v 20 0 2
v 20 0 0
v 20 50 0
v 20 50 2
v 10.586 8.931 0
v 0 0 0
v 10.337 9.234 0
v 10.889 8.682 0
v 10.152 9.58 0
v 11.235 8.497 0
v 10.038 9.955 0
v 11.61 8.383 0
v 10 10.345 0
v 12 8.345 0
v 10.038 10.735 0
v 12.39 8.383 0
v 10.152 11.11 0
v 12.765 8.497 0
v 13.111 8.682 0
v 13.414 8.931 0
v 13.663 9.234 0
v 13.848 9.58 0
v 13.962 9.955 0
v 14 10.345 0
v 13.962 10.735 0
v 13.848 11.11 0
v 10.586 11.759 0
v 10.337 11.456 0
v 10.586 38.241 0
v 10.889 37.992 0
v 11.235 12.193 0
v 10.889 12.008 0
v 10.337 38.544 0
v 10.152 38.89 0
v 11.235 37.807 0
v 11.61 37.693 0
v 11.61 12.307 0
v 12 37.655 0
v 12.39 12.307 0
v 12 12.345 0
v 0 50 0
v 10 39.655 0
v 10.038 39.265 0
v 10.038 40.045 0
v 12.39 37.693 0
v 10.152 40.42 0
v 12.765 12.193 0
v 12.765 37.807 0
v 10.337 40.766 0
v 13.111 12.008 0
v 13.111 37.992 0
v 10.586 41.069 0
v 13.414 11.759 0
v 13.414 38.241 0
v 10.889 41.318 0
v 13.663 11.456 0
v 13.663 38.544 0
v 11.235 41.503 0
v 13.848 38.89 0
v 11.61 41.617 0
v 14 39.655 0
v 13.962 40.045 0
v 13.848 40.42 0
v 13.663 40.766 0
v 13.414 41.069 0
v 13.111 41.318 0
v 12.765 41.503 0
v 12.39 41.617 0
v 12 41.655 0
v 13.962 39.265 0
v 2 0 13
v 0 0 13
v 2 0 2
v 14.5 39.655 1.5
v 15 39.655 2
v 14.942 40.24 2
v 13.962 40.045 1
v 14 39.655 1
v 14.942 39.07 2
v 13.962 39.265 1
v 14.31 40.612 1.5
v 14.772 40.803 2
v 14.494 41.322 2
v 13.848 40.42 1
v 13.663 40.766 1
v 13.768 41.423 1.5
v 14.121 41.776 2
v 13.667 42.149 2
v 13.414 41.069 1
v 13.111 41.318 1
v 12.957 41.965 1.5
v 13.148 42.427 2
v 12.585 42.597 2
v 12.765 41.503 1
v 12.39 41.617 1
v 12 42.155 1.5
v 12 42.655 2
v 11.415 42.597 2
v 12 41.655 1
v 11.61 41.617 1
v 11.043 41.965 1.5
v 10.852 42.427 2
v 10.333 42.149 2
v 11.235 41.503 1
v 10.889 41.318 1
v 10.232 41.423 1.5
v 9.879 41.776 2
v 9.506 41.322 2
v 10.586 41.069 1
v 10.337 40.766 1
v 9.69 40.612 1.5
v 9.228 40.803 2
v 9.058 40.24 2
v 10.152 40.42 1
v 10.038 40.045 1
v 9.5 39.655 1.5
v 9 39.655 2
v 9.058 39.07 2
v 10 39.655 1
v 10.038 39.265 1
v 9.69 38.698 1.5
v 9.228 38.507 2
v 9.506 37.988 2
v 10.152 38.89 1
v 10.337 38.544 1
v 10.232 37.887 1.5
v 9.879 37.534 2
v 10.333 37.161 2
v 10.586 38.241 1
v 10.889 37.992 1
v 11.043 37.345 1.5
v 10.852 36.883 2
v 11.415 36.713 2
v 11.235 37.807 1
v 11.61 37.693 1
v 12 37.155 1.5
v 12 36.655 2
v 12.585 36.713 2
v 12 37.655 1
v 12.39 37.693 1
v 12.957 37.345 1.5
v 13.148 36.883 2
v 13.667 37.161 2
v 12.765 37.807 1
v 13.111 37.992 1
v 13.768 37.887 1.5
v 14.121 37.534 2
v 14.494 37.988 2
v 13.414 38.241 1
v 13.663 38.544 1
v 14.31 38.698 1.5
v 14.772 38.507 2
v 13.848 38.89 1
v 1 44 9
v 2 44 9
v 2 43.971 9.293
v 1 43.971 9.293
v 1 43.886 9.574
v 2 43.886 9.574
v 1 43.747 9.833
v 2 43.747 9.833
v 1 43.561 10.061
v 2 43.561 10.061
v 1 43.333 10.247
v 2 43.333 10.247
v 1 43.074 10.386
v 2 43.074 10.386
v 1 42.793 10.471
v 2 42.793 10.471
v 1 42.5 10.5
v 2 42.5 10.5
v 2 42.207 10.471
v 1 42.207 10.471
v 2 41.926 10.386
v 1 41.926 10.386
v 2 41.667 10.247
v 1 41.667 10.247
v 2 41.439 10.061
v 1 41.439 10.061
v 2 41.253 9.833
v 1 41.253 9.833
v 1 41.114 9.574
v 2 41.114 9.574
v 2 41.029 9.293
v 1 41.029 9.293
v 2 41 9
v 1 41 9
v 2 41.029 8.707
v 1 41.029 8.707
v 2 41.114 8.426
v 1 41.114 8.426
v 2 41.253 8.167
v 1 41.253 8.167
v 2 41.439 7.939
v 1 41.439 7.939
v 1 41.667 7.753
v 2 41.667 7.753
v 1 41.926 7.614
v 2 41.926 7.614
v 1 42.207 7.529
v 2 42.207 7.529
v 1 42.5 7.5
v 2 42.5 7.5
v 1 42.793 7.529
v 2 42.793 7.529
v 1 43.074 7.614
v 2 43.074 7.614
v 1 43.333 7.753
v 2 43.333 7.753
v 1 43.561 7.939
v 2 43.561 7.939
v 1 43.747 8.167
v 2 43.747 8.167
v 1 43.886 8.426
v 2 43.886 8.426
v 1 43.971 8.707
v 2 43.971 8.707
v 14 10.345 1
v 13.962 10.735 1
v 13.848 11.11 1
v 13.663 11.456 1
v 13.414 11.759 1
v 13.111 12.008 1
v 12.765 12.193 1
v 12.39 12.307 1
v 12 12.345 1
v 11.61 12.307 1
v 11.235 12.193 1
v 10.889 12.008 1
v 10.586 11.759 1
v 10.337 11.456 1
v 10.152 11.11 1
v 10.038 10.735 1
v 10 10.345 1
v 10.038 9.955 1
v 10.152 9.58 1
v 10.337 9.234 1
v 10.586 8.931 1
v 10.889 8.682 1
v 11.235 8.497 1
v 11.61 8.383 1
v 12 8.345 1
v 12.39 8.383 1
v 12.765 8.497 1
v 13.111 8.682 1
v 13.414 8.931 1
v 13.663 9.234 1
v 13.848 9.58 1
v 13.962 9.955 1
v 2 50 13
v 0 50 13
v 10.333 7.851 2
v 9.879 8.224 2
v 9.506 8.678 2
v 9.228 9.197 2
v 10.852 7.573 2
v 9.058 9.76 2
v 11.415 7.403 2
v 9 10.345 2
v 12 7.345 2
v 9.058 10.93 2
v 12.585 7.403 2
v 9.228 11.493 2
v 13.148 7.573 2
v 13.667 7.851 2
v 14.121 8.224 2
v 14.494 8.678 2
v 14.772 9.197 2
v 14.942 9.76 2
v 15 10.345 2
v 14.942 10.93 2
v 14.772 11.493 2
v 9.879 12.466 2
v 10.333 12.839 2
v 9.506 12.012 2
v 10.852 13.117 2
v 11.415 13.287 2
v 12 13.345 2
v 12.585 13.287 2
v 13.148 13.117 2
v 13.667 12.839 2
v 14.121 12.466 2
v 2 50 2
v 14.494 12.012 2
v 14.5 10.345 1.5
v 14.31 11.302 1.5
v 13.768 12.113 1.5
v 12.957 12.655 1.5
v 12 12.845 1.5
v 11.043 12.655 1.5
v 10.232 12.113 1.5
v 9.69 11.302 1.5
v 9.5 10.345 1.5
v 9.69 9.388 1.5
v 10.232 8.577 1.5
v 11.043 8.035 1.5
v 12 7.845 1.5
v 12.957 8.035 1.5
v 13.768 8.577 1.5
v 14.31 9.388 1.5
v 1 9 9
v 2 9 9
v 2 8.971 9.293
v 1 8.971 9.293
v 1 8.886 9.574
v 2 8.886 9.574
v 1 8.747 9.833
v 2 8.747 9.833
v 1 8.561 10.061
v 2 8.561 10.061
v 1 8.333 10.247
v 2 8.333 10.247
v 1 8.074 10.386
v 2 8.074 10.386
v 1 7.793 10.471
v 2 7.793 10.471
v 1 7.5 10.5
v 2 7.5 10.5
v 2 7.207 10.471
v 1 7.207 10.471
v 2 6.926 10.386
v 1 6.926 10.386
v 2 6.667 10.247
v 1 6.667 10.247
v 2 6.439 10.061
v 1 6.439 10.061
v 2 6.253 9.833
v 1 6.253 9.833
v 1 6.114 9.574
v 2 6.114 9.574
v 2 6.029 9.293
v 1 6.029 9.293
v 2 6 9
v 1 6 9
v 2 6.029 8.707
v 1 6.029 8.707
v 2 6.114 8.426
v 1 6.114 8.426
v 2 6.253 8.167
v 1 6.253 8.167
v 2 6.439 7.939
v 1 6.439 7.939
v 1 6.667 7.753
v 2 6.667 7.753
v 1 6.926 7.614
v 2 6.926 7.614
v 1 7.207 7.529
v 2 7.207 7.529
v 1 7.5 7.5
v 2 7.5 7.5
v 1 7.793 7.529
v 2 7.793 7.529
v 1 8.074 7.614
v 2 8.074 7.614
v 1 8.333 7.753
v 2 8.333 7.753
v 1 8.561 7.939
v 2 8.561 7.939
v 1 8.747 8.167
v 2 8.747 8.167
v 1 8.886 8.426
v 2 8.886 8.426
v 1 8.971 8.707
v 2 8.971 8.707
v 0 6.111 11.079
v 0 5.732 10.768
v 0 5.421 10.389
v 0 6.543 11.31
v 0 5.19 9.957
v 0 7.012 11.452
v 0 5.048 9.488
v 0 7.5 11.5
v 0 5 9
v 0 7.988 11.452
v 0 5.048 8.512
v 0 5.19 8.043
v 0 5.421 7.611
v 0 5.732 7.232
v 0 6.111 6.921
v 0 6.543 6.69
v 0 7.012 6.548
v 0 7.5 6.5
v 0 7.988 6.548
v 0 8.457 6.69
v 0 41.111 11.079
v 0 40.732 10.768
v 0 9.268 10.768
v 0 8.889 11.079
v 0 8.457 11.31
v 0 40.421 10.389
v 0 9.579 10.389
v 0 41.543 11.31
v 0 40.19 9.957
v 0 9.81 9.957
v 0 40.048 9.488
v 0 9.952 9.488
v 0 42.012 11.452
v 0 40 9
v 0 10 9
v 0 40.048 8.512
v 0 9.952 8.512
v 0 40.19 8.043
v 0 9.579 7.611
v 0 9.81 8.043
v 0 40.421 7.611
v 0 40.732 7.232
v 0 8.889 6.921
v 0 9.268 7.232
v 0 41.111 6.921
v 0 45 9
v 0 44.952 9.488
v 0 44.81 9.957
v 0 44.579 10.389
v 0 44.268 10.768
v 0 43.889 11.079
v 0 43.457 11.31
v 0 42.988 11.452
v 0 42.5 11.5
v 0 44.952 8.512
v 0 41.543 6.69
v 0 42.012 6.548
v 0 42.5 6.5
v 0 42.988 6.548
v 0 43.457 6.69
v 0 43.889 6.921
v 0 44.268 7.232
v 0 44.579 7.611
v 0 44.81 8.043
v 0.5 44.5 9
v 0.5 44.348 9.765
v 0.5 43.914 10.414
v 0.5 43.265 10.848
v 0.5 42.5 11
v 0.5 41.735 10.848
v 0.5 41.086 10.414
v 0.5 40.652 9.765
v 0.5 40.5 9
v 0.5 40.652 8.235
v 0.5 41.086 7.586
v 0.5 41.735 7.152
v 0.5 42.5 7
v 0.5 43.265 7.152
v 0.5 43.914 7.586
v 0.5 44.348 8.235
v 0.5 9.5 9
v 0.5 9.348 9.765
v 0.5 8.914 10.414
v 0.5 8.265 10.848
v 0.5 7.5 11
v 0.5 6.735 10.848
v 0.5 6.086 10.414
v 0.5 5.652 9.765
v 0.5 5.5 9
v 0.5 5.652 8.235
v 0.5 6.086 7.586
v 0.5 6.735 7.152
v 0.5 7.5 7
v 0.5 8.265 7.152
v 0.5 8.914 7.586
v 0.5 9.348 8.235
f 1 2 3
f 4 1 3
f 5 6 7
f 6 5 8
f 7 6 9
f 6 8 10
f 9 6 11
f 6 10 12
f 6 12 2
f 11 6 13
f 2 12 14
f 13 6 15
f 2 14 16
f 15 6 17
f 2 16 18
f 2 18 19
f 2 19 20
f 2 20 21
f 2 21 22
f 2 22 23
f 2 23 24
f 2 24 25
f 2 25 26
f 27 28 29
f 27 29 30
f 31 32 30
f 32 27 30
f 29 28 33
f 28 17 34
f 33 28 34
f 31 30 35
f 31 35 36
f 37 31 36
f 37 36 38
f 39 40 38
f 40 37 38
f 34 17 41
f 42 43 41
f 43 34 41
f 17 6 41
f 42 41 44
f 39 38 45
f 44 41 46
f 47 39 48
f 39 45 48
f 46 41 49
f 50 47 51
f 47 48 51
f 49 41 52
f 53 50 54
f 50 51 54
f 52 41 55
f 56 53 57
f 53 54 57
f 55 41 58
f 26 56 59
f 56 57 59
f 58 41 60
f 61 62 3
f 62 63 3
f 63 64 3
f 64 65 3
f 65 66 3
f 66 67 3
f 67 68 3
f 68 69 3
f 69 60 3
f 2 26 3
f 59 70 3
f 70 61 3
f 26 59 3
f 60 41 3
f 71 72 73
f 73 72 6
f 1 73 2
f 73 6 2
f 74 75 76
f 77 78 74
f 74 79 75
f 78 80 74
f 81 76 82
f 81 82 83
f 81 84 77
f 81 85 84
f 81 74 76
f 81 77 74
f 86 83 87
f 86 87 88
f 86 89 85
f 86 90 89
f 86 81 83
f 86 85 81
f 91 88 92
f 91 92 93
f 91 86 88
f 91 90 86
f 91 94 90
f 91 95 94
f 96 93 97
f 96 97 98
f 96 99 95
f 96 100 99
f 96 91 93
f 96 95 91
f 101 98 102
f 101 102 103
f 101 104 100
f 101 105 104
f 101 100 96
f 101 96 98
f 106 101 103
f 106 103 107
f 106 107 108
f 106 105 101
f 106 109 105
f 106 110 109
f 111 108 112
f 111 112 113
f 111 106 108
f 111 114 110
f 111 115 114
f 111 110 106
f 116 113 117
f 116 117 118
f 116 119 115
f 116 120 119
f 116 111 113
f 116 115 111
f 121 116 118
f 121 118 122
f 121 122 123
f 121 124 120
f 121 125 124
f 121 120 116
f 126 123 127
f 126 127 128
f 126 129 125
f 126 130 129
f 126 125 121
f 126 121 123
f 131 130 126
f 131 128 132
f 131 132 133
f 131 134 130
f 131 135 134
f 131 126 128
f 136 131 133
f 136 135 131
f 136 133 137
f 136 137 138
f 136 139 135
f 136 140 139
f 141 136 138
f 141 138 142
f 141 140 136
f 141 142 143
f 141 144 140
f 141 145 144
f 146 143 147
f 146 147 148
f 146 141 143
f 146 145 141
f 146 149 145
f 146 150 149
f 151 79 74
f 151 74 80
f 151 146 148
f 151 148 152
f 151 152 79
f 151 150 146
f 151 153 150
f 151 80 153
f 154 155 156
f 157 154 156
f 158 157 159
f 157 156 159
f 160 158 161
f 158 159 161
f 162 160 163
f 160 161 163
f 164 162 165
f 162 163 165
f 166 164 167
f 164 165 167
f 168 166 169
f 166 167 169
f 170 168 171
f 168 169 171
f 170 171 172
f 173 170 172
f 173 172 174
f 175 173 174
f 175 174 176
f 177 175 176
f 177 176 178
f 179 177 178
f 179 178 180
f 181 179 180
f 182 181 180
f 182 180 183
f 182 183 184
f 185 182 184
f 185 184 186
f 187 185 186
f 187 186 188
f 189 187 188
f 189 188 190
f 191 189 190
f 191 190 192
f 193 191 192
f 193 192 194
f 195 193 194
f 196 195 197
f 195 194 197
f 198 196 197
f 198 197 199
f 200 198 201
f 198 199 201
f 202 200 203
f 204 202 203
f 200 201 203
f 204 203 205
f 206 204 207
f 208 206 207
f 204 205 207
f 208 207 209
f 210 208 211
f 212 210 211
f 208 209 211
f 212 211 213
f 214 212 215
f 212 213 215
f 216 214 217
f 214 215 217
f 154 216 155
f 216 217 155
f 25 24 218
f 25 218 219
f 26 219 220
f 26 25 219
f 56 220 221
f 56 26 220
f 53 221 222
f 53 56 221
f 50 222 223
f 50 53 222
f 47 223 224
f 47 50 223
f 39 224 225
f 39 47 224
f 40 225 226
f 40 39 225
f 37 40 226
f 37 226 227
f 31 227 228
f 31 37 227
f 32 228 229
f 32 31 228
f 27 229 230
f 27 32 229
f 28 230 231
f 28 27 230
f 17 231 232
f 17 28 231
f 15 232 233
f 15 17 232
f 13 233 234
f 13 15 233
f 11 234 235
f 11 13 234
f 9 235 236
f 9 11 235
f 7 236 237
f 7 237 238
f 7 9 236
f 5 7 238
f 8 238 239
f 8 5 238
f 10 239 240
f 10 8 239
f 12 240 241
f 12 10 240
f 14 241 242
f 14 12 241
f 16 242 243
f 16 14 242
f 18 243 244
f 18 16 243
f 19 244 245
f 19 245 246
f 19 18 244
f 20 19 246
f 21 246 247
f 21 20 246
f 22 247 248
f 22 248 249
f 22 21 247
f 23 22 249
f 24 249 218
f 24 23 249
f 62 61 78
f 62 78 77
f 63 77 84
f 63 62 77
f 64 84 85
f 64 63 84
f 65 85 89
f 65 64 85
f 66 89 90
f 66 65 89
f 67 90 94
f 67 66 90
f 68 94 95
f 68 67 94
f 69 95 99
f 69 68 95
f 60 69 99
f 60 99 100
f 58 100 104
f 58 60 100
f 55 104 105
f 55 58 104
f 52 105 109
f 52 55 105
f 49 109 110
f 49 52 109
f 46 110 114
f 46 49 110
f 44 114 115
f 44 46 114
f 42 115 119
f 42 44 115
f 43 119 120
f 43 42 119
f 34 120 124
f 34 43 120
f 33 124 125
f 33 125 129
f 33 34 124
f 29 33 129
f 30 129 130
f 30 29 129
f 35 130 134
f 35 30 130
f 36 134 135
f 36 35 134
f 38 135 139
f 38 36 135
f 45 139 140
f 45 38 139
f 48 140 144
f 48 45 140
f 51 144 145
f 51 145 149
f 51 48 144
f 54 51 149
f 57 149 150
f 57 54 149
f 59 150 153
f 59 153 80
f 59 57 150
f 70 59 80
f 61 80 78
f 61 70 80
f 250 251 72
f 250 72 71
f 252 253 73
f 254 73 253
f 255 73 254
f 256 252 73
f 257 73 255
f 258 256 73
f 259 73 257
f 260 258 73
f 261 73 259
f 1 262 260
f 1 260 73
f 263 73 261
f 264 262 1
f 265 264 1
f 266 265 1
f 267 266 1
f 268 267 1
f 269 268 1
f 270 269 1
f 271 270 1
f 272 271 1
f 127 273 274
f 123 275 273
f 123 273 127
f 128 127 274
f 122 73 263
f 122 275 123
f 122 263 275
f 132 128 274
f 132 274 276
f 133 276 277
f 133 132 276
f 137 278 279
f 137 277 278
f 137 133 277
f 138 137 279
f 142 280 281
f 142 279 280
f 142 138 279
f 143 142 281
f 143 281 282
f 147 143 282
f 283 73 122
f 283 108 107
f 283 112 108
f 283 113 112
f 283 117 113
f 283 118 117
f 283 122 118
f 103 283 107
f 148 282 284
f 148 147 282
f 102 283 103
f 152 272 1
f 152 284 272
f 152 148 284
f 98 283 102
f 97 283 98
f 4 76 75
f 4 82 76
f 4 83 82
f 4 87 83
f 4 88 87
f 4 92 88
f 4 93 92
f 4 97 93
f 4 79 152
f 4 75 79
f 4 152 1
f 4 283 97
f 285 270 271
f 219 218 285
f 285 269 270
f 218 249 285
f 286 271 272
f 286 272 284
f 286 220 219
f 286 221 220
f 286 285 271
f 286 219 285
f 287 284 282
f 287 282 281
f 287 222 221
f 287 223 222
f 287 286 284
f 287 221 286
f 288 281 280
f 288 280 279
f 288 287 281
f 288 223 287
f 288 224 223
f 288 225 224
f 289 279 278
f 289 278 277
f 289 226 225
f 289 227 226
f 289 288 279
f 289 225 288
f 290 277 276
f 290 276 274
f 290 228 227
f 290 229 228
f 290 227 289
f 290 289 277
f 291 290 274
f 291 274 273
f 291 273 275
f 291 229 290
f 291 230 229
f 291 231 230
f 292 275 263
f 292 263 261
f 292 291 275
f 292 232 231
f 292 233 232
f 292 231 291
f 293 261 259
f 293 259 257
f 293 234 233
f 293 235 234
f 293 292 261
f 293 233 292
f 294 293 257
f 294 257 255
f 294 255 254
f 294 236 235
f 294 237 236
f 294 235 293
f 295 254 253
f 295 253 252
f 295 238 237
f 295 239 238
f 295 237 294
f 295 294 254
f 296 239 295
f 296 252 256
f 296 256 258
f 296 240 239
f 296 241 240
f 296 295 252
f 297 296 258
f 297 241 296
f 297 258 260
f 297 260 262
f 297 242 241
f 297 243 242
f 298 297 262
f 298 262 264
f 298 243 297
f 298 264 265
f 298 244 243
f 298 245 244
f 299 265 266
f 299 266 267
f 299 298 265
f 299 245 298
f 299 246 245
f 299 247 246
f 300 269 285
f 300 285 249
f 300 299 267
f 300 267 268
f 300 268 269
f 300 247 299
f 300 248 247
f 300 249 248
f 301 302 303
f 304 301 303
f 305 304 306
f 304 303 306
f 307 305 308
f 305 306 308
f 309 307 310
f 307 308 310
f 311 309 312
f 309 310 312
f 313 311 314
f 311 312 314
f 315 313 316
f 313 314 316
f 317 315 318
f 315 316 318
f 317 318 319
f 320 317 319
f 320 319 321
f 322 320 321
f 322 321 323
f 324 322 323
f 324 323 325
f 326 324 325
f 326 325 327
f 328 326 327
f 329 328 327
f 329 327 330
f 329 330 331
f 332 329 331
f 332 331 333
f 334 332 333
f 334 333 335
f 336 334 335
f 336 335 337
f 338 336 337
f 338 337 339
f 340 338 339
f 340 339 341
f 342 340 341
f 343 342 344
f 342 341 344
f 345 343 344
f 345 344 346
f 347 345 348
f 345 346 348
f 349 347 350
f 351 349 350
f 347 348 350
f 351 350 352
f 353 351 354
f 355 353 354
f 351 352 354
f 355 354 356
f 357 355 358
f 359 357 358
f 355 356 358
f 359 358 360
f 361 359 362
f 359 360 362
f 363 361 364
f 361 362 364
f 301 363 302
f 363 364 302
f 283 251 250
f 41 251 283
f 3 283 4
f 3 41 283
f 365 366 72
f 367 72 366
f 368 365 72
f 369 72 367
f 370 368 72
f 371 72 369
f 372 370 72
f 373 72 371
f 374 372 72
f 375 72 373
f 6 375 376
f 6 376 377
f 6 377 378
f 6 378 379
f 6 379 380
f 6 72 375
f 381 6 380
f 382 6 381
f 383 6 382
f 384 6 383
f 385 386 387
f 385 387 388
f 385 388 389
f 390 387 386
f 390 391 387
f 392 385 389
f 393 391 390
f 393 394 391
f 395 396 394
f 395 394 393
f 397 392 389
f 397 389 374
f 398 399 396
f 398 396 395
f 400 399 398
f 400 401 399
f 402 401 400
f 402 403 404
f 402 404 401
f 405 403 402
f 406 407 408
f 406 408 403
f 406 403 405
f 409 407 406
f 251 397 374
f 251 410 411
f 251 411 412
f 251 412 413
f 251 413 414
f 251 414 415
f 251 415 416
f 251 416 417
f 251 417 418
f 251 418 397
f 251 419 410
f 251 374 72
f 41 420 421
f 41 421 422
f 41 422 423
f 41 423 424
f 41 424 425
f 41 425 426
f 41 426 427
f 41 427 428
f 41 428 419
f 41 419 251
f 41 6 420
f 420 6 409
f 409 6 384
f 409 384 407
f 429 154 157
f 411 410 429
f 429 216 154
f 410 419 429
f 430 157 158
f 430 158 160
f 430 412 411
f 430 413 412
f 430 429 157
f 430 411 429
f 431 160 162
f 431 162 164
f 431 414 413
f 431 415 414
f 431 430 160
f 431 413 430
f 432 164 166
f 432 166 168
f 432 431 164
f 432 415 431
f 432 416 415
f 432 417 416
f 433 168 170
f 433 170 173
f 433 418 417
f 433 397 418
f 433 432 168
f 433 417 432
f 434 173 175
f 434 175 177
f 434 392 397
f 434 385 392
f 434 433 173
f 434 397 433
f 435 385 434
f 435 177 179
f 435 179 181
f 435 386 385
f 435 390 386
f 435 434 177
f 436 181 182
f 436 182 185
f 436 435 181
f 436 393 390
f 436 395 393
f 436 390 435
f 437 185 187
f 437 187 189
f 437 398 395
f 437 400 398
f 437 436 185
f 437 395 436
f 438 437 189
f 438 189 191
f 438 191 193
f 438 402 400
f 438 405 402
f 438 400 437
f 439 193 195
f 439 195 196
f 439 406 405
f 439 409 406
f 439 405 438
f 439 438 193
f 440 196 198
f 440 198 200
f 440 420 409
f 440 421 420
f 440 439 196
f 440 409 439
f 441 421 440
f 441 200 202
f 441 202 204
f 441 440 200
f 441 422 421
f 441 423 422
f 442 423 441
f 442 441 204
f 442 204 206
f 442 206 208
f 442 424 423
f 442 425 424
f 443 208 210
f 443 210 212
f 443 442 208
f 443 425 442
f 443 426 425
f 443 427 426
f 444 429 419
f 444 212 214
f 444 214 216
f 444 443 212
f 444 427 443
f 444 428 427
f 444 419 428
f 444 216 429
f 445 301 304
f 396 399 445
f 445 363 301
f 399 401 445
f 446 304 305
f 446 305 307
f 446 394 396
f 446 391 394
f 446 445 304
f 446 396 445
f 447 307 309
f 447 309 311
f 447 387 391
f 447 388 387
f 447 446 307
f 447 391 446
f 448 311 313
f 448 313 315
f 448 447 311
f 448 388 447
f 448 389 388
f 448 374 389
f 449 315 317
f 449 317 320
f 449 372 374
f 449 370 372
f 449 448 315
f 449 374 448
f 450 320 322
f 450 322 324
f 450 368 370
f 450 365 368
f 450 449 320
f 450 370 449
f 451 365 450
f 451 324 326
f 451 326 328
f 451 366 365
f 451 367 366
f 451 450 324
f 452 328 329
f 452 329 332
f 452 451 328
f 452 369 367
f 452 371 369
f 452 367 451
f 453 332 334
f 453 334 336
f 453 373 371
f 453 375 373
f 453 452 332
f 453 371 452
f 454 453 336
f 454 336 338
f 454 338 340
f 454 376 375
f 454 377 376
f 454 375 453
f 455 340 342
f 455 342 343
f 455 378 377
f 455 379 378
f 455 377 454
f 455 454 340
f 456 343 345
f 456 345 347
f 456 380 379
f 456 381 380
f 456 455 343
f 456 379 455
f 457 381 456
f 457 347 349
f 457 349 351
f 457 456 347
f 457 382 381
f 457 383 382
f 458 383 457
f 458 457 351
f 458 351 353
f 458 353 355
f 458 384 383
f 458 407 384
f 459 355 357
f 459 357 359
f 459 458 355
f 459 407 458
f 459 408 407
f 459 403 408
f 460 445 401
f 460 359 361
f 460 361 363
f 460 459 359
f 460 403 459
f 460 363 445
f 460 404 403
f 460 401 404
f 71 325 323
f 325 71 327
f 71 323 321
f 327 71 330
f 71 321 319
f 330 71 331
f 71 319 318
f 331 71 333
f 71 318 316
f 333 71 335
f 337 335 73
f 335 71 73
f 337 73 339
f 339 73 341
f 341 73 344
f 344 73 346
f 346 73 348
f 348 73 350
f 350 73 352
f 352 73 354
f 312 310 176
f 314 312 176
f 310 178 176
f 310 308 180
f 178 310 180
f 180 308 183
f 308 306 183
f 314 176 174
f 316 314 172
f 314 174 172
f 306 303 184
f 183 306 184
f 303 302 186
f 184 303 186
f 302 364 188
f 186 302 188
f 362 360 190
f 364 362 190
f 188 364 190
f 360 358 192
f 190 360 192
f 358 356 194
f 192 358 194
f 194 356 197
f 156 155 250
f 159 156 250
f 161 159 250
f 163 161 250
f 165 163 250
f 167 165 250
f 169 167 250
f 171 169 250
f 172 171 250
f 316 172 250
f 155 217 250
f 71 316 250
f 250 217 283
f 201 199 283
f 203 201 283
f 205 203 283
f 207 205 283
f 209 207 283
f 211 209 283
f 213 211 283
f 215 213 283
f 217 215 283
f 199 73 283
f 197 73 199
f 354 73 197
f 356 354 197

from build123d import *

# Parameters (mm, degrees)
SKETCH_W        = 20
SKETCH_H        = 50
SKETCH_R        = 2
PAD_DEPTH       = 2
SKETCH001_W     = 2
SKETCH001_H     = 50
PAD001_DEPTH    = 13
SKETCH002_R     = 1.5
POCKET_DEPTH    = 10
CHAMFER_SIZE    = 1
CHAMFER001_SIZE = 1


with BuildPart() as part:
    # Sketch → Pad (new body)
    with BuildSketch(Plane.XY):
        with Locations((10, 25)):
            Rectangle(SKETCH_W, SKETCH_H)
        with Locations((12, 39.655)):
            Circle(SKETCH_R, mode=Mode.SUBTRACT)
        with Locations((12, 10.345)):
            Circle(SKETCH_R, mode=Mode.SUBTRACT)
    extrude(amount=PAD_DEPTH)

    # Sketch001 → Pad001 (join)
    with BuildSketch(Plane.XY):
        with Locations((1, 25)):
            Rectangle(SKETCH001_W, SKETCH001_H)
    extrude(amount=PAD001_DEPTH)

    # Sketch002 (on Face10 of Pad001) → Pocket (cut)
    with BuildSketch(Plane.YZ.offset(2)):
        with Locations((7.5, 9)):
            Circle(SKETCH002_R)
        with Locations((42.5, 9)):
            Circle(SKETCH002_R)
    extrude(amount=-POCKET_DEPTH, mode=Mode.SUBTRACT)

    # Chamfer
    chamfer_edges = [part.edges().sort_by_distance(p)[0] for p in [
        (10, 39.655, 2),
        (10, 10.345, 2),
    ]]
    chamfer(chamfer_edges, length=CHAMFER_SIZE)

    # Chamfer001
    chamfer001_edges = [part.edges().sort_by_distance(p)[0] for p in [
        (0, 41, 9),
        (0, 6, 9),
    ]]
    chamfer(chamfer001_edges, length=CHAMFER001_SIZE)


solid = part.part
